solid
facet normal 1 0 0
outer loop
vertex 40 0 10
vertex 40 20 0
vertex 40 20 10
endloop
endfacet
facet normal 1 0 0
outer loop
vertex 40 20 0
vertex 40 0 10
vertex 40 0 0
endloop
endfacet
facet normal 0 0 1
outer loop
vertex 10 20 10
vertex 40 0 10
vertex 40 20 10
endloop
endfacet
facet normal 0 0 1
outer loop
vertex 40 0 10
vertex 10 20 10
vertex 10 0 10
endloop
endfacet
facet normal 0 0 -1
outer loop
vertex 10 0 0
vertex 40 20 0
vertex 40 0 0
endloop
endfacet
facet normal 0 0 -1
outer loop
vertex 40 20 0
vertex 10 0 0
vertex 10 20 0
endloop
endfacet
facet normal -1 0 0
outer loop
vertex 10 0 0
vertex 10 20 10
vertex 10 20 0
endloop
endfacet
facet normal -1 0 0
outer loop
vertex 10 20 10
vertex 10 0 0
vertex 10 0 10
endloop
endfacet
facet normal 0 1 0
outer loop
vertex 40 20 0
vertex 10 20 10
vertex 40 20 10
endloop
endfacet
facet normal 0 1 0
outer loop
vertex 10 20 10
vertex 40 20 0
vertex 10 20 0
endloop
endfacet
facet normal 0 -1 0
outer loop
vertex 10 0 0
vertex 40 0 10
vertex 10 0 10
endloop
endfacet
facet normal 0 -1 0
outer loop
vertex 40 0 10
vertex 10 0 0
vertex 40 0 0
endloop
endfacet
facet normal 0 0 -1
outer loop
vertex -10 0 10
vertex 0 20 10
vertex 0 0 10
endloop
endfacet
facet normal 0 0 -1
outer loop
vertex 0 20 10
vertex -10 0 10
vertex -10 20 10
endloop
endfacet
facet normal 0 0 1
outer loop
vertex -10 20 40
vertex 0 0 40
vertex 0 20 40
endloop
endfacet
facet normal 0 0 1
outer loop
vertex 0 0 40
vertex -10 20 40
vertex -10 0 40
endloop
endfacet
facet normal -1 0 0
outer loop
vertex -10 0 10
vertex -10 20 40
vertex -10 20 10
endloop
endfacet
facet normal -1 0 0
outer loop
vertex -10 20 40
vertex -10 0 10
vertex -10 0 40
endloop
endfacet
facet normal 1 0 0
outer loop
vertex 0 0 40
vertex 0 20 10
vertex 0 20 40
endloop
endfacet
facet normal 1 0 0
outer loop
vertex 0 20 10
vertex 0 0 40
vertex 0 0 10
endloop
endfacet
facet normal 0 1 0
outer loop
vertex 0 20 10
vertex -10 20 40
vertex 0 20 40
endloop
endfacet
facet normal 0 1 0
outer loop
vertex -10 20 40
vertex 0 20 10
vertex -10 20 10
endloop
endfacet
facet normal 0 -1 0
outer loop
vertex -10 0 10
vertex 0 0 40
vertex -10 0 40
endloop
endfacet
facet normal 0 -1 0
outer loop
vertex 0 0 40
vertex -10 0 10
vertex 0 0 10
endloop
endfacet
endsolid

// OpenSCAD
module mycube()
{
  translate([10,0,0])
    cube(size = [30,20,10]);
}

mycube();

rotate([0,-90,0])
  mycube();
